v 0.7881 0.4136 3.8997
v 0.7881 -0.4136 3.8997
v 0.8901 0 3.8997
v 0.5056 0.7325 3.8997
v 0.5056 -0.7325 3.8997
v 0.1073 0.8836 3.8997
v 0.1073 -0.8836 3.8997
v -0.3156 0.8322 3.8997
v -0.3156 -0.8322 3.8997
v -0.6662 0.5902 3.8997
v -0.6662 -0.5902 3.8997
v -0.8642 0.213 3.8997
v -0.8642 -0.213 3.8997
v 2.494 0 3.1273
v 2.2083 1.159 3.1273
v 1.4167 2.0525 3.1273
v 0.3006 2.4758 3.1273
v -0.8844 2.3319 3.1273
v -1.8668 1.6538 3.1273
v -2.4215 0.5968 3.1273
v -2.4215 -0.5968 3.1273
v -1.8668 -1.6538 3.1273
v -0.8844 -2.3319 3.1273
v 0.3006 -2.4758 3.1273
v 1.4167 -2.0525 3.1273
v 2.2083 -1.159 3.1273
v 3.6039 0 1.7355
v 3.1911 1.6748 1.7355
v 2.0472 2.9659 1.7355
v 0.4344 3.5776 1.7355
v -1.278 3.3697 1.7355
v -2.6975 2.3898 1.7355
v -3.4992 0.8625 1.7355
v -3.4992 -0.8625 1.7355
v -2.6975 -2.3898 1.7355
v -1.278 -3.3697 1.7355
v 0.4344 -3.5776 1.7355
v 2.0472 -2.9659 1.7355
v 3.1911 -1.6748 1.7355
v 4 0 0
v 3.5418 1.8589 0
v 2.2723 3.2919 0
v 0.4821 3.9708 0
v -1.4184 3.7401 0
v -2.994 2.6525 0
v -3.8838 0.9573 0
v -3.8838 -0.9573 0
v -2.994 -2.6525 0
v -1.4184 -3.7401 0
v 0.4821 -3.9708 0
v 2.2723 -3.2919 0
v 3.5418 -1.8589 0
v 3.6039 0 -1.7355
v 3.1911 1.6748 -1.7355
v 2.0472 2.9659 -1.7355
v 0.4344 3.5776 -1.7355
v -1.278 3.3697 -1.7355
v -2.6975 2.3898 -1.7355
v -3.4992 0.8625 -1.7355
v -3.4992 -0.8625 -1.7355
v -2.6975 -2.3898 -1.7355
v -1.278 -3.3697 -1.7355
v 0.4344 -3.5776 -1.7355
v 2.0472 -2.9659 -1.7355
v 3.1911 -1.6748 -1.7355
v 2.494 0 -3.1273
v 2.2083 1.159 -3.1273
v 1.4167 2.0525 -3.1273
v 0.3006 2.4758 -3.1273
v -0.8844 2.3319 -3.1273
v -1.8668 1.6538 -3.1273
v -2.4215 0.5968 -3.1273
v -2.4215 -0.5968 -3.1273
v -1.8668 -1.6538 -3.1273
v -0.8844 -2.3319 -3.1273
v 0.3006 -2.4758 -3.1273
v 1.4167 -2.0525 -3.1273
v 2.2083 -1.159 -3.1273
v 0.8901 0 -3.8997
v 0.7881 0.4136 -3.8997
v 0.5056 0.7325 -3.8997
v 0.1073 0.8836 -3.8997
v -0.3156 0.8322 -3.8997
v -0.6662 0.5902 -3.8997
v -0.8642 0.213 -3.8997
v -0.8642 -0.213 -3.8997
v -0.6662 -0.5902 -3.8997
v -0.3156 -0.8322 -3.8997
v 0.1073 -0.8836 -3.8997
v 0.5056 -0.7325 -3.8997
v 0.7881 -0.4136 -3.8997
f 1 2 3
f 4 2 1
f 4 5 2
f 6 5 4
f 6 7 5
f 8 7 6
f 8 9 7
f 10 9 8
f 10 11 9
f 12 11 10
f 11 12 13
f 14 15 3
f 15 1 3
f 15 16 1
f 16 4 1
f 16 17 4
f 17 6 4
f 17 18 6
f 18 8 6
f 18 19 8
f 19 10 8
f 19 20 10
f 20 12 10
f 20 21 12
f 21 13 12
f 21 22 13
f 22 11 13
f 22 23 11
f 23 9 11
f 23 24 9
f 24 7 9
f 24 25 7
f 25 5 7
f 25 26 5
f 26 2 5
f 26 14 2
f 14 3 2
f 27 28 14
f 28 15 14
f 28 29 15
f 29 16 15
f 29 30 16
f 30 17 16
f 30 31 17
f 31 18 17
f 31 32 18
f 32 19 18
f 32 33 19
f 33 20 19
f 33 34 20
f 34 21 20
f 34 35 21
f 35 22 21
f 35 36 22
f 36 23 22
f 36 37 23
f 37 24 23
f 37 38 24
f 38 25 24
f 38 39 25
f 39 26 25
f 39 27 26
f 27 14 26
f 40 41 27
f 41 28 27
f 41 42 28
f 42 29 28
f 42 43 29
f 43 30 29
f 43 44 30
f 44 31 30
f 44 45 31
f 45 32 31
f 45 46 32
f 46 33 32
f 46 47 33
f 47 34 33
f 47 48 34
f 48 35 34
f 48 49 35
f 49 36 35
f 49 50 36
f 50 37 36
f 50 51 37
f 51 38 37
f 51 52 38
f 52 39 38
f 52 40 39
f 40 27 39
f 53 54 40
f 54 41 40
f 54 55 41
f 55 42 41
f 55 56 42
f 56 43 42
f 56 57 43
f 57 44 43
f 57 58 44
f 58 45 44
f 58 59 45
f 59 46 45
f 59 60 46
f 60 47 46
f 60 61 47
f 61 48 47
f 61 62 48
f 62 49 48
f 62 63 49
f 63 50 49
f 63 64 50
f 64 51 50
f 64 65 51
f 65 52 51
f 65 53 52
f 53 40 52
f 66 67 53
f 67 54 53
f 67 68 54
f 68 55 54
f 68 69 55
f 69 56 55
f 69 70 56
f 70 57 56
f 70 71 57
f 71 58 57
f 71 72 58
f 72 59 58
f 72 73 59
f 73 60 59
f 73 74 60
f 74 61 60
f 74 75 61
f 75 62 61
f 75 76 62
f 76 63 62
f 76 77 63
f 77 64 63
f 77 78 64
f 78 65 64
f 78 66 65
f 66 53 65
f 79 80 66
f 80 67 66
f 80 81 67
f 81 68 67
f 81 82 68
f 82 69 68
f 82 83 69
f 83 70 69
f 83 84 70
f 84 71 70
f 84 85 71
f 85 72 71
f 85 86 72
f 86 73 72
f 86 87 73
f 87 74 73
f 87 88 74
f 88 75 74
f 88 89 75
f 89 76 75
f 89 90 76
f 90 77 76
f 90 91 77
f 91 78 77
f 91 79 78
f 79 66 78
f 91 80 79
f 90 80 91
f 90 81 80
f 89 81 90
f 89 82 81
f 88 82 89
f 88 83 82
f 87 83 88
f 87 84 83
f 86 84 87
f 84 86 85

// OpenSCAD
// Generated by generate_scads.py
union() {
  union() {
    sphere(r=4);
  }
}
